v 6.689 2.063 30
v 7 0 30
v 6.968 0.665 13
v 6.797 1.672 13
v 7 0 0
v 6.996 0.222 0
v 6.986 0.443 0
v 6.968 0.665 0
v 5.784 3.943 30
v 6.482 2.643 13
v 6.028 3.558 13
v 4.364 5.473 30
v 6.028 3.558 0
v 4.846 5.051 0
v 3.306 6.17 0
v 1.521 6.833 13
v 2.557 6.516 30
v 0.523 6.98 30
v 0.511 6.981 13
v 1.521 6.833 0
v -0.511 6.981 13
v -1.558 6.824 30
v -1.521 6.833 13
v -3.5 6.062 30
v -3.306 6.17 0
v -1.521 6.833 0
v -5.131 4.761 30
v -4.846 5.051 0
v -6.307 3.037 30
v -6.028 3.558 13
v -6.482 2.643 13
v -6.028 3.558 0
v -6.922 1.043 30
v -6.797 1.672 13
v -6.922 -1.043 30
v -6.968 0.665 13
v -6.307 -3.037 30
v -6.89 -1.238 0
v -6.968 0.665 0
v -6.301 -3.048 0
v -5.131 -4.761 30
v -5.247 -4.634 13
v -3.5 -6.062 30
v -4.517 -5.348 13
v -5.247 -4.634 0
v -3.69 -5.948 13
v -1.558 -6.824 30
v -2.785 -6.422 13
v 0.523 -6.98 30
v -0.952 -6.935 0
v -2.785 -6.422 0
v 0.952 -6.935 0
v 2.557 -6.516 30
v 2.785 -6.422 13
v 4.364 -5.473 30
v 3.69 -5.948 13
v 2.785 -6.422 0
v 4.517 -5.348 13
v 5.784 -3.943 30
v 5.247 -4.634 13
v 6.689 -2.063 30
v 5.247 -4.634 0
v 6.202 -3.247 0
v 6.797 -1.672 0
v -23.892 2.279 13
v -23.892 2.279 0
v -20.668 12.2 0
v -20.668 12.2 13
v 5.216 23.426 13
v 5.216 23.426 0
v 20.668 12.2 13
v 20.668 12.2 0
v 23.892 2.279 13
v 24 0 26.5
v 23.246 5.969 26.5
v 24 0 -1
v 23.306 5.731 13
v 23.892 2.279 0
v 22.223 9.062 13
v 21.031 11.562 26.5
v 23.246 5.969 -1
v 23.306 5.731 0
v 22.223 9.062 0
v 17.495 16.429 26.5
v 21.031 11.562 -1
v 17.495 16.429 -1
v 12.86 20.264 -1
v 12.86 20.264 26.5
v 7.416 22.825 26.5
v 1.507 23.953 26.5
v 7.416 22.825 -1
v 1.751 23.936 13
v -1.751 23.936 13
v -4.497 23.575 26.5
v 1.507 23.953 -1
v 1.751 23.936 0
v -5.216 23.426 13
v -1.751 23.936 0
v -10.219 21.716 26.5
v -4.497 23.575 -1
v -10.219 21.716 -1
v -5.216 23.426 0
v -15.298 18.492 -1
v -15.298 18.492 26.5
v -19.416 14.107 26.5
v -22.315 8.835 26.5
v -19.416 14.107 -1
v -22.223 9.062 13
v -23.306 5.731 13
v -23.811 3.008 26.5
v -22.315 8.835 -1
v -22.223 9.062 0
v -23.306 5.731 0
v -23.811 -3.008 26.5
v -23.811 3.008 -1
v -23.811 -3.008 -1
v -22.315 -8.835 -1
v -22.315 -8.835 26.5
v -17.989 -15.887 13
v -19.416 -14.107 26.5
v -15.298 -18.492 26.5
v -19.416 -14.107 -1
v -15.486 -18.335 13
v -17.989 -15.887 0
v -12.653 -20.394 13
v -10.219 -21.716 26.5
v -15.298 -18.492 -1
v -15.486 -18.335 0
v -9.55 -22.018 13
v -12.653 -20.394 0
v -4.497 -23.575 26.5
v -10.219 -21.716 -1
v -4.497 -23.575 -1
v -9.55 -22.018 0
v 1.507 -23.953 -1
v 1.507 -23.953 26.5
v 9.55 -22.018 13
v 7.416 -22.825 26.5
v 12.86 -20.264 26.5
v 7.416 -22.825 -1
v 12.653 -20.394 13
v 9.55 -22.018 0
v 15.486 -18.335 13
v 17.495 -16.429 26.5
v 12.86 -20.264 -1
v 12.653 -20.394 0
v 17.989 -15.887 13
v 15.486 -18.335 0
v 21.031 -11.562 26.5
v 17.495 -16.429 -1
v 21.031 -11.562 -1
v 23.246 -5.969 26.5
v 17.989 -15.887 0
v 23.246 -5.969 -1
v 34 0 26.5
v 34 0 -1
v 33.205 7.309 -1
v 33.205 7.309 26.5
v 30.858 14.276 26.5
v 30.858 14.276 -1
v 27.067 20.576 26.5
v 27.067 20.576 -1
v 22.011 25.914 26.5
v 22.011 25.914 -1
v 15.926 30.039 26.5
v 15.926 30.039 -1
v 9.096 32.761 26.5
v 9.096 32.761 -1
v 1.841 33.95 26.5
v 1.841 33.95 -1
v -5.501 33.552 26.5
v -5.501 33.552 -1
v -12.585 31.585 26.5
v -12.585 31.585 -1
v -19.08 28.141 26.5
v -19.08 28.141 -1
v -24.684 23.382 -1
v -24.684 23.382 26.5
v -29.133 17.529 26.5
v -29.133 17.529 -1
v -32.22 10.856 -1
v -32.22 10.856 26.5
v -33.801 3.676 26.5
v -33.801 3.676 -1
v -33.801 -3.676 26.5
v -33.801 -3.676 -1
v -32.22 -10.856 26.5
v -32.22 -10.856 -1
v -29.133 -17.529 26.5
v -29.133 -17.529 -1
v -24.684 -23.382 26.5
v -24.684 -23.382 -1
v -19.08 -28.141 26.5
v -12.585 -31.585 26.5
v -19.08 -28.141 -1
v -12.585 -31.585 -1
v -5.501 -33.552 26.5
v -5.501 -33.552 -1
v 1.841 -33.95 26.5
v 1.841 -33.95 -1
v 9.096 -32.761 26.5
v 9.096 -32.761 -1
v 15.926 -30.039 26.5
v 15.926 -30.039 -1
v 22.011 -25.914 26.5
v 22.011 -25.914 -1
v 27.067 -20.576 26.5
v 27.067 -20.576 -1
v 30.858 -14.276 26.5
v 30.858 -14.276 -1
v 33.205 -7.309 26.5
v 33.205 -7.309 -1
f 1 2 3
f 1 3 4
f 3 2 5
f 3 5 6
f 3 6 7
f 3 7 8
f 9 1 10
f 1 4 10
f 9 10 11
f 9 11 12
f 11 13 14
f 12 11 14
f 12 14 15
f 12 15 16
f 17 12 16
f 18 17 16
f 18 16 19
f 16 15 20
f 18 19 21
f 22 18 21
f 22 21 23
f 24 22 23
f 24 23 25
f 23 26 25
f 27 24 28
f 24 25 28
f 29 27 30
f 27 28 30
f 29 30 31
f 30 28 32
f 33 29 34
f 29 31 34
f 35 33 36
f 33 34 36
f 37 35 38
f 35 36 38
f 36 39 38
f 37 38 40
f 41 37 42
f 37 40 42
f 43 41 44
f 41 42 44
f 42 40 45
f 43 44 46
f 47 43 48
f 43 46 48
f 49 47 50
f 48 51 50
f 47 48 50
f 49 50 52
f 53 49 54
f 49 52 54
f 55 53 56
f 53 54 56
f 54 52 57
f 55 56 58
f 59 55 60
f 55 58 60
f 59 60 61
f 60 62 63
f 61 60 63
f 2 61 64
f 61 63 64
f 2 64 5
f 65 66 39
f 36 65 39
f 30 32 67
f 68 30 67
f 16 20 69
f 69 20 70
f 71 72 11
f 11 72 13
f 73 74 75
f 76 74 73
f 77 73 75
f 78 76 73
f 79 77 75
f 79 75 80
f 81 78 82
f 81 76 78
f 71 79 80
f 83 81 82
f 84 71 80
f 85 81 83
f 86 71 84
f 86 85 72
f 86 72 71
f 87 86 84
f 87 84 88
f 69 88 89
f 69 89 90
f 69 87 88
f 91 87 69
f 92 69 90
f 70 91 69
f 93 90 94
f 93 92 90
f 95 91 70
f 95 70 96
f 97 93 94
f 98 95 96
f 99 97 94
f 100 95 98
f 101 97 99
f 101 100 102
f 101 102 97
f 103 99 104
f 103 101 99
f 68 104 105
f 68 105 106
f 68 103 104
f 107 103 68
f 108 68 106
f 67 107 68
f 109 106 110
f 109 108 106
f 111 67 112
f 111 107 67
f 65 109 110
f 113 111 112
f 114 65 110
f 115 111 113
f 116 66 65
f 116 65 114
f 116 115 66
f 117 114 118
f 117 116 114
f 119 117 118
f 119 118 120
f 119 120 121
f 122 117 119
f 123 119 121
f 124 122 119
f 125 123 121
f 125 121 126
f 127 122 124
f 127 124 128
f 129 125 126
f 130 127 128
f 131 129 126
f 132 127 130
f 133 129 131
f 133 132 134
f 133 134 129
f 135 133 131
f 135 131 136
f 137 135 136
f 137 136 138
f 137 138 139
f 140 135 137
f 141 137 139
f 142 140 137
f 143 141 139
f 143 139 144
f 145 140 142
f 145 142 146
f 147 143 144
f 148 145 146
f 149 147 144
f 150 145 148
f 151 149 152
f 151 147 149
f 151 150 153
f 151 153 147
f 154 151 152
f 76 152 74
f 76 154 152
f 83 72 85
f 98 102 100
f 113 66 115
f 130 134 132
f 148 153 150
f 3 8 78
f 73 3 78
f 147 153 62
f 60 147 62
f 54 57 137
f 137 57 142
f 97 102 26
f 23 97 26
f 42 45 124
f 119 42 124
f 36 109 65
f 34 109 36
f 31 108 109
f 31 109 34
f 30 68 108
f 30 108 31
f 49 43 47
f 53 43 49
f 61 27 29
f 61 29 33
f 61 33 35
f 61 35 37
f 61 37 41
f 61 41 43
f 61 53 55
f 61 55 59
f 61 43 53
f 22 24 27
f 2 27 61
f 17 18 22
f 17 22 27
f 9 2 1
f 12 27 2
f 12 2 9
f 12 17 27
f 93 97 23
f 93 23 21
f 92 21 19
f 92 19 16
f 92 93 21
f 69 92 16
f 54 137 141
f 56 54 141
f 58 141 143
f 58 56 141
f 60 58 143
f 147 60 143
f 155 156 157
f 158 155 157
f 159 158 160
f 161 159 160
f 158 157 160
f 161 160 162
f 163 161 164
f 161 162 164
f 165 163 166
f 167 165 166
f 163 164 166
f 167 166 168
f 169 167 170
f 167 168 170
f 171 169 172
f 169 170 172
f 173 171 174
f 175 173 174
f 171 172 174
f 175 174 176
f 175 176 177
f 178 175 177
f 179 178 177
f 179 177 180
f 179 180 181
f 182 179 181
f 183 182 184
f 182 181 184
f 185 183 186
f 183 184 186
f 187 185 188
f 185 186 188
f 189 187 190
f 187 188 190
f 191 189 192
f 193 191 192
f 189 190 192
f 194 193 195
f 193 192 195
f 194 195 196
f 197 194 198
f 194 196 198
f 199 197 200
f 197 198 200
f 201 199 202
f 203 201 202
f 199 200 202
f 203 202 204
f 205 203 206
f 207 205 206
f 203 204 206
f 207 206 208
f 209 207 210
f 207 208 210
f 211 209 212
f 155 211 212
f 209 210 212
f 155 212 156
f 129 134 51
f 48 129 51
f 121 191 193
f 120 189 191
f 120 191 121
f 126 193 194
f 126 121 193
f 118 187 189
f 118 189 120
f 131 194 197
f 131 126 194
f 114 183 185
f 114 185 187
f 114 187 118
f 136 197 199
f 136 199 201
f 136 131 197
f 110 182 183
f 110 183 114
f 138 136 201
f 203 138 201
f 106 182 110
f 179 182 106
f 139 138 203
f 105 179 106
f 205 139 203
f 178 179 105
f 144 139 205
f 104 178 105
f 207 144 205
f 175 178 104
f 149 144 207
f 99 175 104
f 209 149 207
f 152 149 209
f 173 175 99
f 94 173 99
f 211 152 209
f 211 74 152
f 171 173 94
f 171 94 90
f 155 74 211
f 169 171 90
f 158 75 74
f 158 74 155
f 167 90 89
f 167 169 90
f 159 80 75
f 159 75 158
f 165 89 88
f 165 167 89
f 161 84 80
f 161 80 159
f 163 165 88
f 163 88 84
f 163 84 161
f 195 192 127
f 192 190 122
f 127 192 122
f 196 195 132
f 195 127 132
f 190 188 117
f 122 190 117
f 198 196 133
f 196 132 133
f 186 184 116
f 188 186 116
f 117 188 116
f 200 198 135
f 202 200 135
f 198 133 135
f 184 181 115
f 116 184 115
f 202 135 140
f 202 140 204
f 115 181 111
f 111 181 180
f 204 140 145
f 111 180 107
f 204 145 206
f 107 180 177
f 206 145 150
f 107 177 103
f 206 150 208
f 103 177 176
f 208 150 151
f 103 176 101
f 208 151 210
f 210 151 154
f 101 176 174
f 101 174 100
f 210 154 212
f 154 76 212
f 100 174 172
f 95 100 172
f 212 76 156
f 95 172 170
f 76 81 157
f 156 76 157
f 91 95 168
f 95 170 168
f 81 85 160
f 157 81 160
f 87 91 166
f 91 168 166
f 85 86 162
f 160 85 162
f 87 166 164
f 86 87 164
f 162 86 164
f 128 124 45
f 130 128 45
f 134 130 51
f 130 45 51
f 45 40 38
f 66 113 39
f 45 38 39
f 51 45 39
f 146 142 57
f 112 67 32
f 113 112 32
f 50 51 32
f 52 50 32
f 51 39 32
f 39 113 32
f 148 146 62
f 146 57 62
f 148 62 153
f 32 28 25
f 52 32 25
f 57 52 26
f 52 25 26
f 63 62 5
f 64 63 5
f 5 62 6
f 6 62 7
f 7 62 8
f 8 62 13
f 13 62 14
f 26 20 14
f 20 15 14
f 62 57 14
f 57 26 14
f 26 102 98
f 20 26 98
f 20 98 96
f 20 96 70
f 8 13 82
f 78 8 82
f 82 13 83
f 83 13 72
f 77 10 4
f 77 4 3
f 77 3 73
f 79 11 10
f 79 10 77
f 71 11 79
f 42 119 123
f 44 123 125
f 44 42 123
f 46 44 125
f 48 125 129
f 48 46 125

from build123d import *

# Parameters (mm, degrees)
SALIENTE_EXTRUIR2_DEPTH      = 26.5
SALIENTE_EXTRUIR2_DEPTH_BACK = 1
CROQUIS1_R                   = 34
CROQUIS1_R_2                 = 24
CROQUIS2_R                   = 7
SALIENTE_EXTRUIR3_DEPTH      = 30
SALIENTE_EXTRUIR4_DEPTH      = 13


with BuildPart() as part:
    # Croquis1 → Saliente-Extruir2 (new, two sides: drawn at the far end of the back side and taken through both)
    with BuildSketch(Plane.XY.offset(-SALIENTE_EXTRUIR2_DEPTH_BACK)):
        Circle(CROQUIS1_R)
        Circle(CROQUIS1_R_2, mode=Mode.SUBTRACT)
    extrude(amount=SALIENTE_EXTRUIR2_DEPTH + SALIENTE_EXTRUIR2_DEPTH_BACK)



with BuildPart() as body_2:
    # Croquis2 → Saliente-Extruir3 (new body)
    with BuildSketch(Plane.XY):
        Circle(CROQUIS2_R)
    extrude(amount=SALIENTE_EXTRUIR3_DEPTH)


with BuildPart() as part_1:
    add(part.part)

    add(body_2.part)  # Saliente-Extruir4 merges body 2
    # Croquis3 → Saliente-Extruir4 (add)
    with BuildSketch(Plane.XY):
        with BuildLine():
            ThreePointArc((5.215852398, 23.426371545), (0, 24), (-5.215852398, 23.426371545))
            Line((-5.215852398, 23.426371545), (0, 0))
            Line((0, 0), (5.215852398, 23.426371545))
        make_face()
        with BuildLine():
            Line((-23.891590342, 2.278576513), (0, 0))
            Line((0, 0), (-20.66801628, 12.199717335))
            ThreePointArc((-20.66801628, 12.199717335), (-22.825356391, 7.416407865), (-23.891590342, 2.278576513))
        make_face()
        with BuildLine():
            Line((20.66801628, 12.199717335), (0, 0))
            Line((0, 0), (23.891590342, 2.278576513))
            ThreePointArc((23.891590342, 2.278576513), (22.825356391, 7.416407865), (20.66801628, 12.199717335))
        make_face()
        with BuildLine():
            Line((17.989388939, -15.886531579), (0, 0))
            Line((0, 0), (9.549962479, -22.018133814))
            ThreePointArc((9.549962479, -22.018133814), (14.106846055, -19.416407865), (17.989388939, -15.886531579))
        make_face()
        with BuildLine():
            Line((-9.549962479, -22.018133814), (0, 0))
            Line((0, 0), (-17.989388939, -15.886531579))
            ThreePointArc((-17.989388939, -15.886531579), (-14.106846055, -19.416407865), (-9.549962479, -22.018133814))
        make_face()
    extrude(amount=SALIENTE_EXTRUIR4_DEPTH)


solid = part_1.part
